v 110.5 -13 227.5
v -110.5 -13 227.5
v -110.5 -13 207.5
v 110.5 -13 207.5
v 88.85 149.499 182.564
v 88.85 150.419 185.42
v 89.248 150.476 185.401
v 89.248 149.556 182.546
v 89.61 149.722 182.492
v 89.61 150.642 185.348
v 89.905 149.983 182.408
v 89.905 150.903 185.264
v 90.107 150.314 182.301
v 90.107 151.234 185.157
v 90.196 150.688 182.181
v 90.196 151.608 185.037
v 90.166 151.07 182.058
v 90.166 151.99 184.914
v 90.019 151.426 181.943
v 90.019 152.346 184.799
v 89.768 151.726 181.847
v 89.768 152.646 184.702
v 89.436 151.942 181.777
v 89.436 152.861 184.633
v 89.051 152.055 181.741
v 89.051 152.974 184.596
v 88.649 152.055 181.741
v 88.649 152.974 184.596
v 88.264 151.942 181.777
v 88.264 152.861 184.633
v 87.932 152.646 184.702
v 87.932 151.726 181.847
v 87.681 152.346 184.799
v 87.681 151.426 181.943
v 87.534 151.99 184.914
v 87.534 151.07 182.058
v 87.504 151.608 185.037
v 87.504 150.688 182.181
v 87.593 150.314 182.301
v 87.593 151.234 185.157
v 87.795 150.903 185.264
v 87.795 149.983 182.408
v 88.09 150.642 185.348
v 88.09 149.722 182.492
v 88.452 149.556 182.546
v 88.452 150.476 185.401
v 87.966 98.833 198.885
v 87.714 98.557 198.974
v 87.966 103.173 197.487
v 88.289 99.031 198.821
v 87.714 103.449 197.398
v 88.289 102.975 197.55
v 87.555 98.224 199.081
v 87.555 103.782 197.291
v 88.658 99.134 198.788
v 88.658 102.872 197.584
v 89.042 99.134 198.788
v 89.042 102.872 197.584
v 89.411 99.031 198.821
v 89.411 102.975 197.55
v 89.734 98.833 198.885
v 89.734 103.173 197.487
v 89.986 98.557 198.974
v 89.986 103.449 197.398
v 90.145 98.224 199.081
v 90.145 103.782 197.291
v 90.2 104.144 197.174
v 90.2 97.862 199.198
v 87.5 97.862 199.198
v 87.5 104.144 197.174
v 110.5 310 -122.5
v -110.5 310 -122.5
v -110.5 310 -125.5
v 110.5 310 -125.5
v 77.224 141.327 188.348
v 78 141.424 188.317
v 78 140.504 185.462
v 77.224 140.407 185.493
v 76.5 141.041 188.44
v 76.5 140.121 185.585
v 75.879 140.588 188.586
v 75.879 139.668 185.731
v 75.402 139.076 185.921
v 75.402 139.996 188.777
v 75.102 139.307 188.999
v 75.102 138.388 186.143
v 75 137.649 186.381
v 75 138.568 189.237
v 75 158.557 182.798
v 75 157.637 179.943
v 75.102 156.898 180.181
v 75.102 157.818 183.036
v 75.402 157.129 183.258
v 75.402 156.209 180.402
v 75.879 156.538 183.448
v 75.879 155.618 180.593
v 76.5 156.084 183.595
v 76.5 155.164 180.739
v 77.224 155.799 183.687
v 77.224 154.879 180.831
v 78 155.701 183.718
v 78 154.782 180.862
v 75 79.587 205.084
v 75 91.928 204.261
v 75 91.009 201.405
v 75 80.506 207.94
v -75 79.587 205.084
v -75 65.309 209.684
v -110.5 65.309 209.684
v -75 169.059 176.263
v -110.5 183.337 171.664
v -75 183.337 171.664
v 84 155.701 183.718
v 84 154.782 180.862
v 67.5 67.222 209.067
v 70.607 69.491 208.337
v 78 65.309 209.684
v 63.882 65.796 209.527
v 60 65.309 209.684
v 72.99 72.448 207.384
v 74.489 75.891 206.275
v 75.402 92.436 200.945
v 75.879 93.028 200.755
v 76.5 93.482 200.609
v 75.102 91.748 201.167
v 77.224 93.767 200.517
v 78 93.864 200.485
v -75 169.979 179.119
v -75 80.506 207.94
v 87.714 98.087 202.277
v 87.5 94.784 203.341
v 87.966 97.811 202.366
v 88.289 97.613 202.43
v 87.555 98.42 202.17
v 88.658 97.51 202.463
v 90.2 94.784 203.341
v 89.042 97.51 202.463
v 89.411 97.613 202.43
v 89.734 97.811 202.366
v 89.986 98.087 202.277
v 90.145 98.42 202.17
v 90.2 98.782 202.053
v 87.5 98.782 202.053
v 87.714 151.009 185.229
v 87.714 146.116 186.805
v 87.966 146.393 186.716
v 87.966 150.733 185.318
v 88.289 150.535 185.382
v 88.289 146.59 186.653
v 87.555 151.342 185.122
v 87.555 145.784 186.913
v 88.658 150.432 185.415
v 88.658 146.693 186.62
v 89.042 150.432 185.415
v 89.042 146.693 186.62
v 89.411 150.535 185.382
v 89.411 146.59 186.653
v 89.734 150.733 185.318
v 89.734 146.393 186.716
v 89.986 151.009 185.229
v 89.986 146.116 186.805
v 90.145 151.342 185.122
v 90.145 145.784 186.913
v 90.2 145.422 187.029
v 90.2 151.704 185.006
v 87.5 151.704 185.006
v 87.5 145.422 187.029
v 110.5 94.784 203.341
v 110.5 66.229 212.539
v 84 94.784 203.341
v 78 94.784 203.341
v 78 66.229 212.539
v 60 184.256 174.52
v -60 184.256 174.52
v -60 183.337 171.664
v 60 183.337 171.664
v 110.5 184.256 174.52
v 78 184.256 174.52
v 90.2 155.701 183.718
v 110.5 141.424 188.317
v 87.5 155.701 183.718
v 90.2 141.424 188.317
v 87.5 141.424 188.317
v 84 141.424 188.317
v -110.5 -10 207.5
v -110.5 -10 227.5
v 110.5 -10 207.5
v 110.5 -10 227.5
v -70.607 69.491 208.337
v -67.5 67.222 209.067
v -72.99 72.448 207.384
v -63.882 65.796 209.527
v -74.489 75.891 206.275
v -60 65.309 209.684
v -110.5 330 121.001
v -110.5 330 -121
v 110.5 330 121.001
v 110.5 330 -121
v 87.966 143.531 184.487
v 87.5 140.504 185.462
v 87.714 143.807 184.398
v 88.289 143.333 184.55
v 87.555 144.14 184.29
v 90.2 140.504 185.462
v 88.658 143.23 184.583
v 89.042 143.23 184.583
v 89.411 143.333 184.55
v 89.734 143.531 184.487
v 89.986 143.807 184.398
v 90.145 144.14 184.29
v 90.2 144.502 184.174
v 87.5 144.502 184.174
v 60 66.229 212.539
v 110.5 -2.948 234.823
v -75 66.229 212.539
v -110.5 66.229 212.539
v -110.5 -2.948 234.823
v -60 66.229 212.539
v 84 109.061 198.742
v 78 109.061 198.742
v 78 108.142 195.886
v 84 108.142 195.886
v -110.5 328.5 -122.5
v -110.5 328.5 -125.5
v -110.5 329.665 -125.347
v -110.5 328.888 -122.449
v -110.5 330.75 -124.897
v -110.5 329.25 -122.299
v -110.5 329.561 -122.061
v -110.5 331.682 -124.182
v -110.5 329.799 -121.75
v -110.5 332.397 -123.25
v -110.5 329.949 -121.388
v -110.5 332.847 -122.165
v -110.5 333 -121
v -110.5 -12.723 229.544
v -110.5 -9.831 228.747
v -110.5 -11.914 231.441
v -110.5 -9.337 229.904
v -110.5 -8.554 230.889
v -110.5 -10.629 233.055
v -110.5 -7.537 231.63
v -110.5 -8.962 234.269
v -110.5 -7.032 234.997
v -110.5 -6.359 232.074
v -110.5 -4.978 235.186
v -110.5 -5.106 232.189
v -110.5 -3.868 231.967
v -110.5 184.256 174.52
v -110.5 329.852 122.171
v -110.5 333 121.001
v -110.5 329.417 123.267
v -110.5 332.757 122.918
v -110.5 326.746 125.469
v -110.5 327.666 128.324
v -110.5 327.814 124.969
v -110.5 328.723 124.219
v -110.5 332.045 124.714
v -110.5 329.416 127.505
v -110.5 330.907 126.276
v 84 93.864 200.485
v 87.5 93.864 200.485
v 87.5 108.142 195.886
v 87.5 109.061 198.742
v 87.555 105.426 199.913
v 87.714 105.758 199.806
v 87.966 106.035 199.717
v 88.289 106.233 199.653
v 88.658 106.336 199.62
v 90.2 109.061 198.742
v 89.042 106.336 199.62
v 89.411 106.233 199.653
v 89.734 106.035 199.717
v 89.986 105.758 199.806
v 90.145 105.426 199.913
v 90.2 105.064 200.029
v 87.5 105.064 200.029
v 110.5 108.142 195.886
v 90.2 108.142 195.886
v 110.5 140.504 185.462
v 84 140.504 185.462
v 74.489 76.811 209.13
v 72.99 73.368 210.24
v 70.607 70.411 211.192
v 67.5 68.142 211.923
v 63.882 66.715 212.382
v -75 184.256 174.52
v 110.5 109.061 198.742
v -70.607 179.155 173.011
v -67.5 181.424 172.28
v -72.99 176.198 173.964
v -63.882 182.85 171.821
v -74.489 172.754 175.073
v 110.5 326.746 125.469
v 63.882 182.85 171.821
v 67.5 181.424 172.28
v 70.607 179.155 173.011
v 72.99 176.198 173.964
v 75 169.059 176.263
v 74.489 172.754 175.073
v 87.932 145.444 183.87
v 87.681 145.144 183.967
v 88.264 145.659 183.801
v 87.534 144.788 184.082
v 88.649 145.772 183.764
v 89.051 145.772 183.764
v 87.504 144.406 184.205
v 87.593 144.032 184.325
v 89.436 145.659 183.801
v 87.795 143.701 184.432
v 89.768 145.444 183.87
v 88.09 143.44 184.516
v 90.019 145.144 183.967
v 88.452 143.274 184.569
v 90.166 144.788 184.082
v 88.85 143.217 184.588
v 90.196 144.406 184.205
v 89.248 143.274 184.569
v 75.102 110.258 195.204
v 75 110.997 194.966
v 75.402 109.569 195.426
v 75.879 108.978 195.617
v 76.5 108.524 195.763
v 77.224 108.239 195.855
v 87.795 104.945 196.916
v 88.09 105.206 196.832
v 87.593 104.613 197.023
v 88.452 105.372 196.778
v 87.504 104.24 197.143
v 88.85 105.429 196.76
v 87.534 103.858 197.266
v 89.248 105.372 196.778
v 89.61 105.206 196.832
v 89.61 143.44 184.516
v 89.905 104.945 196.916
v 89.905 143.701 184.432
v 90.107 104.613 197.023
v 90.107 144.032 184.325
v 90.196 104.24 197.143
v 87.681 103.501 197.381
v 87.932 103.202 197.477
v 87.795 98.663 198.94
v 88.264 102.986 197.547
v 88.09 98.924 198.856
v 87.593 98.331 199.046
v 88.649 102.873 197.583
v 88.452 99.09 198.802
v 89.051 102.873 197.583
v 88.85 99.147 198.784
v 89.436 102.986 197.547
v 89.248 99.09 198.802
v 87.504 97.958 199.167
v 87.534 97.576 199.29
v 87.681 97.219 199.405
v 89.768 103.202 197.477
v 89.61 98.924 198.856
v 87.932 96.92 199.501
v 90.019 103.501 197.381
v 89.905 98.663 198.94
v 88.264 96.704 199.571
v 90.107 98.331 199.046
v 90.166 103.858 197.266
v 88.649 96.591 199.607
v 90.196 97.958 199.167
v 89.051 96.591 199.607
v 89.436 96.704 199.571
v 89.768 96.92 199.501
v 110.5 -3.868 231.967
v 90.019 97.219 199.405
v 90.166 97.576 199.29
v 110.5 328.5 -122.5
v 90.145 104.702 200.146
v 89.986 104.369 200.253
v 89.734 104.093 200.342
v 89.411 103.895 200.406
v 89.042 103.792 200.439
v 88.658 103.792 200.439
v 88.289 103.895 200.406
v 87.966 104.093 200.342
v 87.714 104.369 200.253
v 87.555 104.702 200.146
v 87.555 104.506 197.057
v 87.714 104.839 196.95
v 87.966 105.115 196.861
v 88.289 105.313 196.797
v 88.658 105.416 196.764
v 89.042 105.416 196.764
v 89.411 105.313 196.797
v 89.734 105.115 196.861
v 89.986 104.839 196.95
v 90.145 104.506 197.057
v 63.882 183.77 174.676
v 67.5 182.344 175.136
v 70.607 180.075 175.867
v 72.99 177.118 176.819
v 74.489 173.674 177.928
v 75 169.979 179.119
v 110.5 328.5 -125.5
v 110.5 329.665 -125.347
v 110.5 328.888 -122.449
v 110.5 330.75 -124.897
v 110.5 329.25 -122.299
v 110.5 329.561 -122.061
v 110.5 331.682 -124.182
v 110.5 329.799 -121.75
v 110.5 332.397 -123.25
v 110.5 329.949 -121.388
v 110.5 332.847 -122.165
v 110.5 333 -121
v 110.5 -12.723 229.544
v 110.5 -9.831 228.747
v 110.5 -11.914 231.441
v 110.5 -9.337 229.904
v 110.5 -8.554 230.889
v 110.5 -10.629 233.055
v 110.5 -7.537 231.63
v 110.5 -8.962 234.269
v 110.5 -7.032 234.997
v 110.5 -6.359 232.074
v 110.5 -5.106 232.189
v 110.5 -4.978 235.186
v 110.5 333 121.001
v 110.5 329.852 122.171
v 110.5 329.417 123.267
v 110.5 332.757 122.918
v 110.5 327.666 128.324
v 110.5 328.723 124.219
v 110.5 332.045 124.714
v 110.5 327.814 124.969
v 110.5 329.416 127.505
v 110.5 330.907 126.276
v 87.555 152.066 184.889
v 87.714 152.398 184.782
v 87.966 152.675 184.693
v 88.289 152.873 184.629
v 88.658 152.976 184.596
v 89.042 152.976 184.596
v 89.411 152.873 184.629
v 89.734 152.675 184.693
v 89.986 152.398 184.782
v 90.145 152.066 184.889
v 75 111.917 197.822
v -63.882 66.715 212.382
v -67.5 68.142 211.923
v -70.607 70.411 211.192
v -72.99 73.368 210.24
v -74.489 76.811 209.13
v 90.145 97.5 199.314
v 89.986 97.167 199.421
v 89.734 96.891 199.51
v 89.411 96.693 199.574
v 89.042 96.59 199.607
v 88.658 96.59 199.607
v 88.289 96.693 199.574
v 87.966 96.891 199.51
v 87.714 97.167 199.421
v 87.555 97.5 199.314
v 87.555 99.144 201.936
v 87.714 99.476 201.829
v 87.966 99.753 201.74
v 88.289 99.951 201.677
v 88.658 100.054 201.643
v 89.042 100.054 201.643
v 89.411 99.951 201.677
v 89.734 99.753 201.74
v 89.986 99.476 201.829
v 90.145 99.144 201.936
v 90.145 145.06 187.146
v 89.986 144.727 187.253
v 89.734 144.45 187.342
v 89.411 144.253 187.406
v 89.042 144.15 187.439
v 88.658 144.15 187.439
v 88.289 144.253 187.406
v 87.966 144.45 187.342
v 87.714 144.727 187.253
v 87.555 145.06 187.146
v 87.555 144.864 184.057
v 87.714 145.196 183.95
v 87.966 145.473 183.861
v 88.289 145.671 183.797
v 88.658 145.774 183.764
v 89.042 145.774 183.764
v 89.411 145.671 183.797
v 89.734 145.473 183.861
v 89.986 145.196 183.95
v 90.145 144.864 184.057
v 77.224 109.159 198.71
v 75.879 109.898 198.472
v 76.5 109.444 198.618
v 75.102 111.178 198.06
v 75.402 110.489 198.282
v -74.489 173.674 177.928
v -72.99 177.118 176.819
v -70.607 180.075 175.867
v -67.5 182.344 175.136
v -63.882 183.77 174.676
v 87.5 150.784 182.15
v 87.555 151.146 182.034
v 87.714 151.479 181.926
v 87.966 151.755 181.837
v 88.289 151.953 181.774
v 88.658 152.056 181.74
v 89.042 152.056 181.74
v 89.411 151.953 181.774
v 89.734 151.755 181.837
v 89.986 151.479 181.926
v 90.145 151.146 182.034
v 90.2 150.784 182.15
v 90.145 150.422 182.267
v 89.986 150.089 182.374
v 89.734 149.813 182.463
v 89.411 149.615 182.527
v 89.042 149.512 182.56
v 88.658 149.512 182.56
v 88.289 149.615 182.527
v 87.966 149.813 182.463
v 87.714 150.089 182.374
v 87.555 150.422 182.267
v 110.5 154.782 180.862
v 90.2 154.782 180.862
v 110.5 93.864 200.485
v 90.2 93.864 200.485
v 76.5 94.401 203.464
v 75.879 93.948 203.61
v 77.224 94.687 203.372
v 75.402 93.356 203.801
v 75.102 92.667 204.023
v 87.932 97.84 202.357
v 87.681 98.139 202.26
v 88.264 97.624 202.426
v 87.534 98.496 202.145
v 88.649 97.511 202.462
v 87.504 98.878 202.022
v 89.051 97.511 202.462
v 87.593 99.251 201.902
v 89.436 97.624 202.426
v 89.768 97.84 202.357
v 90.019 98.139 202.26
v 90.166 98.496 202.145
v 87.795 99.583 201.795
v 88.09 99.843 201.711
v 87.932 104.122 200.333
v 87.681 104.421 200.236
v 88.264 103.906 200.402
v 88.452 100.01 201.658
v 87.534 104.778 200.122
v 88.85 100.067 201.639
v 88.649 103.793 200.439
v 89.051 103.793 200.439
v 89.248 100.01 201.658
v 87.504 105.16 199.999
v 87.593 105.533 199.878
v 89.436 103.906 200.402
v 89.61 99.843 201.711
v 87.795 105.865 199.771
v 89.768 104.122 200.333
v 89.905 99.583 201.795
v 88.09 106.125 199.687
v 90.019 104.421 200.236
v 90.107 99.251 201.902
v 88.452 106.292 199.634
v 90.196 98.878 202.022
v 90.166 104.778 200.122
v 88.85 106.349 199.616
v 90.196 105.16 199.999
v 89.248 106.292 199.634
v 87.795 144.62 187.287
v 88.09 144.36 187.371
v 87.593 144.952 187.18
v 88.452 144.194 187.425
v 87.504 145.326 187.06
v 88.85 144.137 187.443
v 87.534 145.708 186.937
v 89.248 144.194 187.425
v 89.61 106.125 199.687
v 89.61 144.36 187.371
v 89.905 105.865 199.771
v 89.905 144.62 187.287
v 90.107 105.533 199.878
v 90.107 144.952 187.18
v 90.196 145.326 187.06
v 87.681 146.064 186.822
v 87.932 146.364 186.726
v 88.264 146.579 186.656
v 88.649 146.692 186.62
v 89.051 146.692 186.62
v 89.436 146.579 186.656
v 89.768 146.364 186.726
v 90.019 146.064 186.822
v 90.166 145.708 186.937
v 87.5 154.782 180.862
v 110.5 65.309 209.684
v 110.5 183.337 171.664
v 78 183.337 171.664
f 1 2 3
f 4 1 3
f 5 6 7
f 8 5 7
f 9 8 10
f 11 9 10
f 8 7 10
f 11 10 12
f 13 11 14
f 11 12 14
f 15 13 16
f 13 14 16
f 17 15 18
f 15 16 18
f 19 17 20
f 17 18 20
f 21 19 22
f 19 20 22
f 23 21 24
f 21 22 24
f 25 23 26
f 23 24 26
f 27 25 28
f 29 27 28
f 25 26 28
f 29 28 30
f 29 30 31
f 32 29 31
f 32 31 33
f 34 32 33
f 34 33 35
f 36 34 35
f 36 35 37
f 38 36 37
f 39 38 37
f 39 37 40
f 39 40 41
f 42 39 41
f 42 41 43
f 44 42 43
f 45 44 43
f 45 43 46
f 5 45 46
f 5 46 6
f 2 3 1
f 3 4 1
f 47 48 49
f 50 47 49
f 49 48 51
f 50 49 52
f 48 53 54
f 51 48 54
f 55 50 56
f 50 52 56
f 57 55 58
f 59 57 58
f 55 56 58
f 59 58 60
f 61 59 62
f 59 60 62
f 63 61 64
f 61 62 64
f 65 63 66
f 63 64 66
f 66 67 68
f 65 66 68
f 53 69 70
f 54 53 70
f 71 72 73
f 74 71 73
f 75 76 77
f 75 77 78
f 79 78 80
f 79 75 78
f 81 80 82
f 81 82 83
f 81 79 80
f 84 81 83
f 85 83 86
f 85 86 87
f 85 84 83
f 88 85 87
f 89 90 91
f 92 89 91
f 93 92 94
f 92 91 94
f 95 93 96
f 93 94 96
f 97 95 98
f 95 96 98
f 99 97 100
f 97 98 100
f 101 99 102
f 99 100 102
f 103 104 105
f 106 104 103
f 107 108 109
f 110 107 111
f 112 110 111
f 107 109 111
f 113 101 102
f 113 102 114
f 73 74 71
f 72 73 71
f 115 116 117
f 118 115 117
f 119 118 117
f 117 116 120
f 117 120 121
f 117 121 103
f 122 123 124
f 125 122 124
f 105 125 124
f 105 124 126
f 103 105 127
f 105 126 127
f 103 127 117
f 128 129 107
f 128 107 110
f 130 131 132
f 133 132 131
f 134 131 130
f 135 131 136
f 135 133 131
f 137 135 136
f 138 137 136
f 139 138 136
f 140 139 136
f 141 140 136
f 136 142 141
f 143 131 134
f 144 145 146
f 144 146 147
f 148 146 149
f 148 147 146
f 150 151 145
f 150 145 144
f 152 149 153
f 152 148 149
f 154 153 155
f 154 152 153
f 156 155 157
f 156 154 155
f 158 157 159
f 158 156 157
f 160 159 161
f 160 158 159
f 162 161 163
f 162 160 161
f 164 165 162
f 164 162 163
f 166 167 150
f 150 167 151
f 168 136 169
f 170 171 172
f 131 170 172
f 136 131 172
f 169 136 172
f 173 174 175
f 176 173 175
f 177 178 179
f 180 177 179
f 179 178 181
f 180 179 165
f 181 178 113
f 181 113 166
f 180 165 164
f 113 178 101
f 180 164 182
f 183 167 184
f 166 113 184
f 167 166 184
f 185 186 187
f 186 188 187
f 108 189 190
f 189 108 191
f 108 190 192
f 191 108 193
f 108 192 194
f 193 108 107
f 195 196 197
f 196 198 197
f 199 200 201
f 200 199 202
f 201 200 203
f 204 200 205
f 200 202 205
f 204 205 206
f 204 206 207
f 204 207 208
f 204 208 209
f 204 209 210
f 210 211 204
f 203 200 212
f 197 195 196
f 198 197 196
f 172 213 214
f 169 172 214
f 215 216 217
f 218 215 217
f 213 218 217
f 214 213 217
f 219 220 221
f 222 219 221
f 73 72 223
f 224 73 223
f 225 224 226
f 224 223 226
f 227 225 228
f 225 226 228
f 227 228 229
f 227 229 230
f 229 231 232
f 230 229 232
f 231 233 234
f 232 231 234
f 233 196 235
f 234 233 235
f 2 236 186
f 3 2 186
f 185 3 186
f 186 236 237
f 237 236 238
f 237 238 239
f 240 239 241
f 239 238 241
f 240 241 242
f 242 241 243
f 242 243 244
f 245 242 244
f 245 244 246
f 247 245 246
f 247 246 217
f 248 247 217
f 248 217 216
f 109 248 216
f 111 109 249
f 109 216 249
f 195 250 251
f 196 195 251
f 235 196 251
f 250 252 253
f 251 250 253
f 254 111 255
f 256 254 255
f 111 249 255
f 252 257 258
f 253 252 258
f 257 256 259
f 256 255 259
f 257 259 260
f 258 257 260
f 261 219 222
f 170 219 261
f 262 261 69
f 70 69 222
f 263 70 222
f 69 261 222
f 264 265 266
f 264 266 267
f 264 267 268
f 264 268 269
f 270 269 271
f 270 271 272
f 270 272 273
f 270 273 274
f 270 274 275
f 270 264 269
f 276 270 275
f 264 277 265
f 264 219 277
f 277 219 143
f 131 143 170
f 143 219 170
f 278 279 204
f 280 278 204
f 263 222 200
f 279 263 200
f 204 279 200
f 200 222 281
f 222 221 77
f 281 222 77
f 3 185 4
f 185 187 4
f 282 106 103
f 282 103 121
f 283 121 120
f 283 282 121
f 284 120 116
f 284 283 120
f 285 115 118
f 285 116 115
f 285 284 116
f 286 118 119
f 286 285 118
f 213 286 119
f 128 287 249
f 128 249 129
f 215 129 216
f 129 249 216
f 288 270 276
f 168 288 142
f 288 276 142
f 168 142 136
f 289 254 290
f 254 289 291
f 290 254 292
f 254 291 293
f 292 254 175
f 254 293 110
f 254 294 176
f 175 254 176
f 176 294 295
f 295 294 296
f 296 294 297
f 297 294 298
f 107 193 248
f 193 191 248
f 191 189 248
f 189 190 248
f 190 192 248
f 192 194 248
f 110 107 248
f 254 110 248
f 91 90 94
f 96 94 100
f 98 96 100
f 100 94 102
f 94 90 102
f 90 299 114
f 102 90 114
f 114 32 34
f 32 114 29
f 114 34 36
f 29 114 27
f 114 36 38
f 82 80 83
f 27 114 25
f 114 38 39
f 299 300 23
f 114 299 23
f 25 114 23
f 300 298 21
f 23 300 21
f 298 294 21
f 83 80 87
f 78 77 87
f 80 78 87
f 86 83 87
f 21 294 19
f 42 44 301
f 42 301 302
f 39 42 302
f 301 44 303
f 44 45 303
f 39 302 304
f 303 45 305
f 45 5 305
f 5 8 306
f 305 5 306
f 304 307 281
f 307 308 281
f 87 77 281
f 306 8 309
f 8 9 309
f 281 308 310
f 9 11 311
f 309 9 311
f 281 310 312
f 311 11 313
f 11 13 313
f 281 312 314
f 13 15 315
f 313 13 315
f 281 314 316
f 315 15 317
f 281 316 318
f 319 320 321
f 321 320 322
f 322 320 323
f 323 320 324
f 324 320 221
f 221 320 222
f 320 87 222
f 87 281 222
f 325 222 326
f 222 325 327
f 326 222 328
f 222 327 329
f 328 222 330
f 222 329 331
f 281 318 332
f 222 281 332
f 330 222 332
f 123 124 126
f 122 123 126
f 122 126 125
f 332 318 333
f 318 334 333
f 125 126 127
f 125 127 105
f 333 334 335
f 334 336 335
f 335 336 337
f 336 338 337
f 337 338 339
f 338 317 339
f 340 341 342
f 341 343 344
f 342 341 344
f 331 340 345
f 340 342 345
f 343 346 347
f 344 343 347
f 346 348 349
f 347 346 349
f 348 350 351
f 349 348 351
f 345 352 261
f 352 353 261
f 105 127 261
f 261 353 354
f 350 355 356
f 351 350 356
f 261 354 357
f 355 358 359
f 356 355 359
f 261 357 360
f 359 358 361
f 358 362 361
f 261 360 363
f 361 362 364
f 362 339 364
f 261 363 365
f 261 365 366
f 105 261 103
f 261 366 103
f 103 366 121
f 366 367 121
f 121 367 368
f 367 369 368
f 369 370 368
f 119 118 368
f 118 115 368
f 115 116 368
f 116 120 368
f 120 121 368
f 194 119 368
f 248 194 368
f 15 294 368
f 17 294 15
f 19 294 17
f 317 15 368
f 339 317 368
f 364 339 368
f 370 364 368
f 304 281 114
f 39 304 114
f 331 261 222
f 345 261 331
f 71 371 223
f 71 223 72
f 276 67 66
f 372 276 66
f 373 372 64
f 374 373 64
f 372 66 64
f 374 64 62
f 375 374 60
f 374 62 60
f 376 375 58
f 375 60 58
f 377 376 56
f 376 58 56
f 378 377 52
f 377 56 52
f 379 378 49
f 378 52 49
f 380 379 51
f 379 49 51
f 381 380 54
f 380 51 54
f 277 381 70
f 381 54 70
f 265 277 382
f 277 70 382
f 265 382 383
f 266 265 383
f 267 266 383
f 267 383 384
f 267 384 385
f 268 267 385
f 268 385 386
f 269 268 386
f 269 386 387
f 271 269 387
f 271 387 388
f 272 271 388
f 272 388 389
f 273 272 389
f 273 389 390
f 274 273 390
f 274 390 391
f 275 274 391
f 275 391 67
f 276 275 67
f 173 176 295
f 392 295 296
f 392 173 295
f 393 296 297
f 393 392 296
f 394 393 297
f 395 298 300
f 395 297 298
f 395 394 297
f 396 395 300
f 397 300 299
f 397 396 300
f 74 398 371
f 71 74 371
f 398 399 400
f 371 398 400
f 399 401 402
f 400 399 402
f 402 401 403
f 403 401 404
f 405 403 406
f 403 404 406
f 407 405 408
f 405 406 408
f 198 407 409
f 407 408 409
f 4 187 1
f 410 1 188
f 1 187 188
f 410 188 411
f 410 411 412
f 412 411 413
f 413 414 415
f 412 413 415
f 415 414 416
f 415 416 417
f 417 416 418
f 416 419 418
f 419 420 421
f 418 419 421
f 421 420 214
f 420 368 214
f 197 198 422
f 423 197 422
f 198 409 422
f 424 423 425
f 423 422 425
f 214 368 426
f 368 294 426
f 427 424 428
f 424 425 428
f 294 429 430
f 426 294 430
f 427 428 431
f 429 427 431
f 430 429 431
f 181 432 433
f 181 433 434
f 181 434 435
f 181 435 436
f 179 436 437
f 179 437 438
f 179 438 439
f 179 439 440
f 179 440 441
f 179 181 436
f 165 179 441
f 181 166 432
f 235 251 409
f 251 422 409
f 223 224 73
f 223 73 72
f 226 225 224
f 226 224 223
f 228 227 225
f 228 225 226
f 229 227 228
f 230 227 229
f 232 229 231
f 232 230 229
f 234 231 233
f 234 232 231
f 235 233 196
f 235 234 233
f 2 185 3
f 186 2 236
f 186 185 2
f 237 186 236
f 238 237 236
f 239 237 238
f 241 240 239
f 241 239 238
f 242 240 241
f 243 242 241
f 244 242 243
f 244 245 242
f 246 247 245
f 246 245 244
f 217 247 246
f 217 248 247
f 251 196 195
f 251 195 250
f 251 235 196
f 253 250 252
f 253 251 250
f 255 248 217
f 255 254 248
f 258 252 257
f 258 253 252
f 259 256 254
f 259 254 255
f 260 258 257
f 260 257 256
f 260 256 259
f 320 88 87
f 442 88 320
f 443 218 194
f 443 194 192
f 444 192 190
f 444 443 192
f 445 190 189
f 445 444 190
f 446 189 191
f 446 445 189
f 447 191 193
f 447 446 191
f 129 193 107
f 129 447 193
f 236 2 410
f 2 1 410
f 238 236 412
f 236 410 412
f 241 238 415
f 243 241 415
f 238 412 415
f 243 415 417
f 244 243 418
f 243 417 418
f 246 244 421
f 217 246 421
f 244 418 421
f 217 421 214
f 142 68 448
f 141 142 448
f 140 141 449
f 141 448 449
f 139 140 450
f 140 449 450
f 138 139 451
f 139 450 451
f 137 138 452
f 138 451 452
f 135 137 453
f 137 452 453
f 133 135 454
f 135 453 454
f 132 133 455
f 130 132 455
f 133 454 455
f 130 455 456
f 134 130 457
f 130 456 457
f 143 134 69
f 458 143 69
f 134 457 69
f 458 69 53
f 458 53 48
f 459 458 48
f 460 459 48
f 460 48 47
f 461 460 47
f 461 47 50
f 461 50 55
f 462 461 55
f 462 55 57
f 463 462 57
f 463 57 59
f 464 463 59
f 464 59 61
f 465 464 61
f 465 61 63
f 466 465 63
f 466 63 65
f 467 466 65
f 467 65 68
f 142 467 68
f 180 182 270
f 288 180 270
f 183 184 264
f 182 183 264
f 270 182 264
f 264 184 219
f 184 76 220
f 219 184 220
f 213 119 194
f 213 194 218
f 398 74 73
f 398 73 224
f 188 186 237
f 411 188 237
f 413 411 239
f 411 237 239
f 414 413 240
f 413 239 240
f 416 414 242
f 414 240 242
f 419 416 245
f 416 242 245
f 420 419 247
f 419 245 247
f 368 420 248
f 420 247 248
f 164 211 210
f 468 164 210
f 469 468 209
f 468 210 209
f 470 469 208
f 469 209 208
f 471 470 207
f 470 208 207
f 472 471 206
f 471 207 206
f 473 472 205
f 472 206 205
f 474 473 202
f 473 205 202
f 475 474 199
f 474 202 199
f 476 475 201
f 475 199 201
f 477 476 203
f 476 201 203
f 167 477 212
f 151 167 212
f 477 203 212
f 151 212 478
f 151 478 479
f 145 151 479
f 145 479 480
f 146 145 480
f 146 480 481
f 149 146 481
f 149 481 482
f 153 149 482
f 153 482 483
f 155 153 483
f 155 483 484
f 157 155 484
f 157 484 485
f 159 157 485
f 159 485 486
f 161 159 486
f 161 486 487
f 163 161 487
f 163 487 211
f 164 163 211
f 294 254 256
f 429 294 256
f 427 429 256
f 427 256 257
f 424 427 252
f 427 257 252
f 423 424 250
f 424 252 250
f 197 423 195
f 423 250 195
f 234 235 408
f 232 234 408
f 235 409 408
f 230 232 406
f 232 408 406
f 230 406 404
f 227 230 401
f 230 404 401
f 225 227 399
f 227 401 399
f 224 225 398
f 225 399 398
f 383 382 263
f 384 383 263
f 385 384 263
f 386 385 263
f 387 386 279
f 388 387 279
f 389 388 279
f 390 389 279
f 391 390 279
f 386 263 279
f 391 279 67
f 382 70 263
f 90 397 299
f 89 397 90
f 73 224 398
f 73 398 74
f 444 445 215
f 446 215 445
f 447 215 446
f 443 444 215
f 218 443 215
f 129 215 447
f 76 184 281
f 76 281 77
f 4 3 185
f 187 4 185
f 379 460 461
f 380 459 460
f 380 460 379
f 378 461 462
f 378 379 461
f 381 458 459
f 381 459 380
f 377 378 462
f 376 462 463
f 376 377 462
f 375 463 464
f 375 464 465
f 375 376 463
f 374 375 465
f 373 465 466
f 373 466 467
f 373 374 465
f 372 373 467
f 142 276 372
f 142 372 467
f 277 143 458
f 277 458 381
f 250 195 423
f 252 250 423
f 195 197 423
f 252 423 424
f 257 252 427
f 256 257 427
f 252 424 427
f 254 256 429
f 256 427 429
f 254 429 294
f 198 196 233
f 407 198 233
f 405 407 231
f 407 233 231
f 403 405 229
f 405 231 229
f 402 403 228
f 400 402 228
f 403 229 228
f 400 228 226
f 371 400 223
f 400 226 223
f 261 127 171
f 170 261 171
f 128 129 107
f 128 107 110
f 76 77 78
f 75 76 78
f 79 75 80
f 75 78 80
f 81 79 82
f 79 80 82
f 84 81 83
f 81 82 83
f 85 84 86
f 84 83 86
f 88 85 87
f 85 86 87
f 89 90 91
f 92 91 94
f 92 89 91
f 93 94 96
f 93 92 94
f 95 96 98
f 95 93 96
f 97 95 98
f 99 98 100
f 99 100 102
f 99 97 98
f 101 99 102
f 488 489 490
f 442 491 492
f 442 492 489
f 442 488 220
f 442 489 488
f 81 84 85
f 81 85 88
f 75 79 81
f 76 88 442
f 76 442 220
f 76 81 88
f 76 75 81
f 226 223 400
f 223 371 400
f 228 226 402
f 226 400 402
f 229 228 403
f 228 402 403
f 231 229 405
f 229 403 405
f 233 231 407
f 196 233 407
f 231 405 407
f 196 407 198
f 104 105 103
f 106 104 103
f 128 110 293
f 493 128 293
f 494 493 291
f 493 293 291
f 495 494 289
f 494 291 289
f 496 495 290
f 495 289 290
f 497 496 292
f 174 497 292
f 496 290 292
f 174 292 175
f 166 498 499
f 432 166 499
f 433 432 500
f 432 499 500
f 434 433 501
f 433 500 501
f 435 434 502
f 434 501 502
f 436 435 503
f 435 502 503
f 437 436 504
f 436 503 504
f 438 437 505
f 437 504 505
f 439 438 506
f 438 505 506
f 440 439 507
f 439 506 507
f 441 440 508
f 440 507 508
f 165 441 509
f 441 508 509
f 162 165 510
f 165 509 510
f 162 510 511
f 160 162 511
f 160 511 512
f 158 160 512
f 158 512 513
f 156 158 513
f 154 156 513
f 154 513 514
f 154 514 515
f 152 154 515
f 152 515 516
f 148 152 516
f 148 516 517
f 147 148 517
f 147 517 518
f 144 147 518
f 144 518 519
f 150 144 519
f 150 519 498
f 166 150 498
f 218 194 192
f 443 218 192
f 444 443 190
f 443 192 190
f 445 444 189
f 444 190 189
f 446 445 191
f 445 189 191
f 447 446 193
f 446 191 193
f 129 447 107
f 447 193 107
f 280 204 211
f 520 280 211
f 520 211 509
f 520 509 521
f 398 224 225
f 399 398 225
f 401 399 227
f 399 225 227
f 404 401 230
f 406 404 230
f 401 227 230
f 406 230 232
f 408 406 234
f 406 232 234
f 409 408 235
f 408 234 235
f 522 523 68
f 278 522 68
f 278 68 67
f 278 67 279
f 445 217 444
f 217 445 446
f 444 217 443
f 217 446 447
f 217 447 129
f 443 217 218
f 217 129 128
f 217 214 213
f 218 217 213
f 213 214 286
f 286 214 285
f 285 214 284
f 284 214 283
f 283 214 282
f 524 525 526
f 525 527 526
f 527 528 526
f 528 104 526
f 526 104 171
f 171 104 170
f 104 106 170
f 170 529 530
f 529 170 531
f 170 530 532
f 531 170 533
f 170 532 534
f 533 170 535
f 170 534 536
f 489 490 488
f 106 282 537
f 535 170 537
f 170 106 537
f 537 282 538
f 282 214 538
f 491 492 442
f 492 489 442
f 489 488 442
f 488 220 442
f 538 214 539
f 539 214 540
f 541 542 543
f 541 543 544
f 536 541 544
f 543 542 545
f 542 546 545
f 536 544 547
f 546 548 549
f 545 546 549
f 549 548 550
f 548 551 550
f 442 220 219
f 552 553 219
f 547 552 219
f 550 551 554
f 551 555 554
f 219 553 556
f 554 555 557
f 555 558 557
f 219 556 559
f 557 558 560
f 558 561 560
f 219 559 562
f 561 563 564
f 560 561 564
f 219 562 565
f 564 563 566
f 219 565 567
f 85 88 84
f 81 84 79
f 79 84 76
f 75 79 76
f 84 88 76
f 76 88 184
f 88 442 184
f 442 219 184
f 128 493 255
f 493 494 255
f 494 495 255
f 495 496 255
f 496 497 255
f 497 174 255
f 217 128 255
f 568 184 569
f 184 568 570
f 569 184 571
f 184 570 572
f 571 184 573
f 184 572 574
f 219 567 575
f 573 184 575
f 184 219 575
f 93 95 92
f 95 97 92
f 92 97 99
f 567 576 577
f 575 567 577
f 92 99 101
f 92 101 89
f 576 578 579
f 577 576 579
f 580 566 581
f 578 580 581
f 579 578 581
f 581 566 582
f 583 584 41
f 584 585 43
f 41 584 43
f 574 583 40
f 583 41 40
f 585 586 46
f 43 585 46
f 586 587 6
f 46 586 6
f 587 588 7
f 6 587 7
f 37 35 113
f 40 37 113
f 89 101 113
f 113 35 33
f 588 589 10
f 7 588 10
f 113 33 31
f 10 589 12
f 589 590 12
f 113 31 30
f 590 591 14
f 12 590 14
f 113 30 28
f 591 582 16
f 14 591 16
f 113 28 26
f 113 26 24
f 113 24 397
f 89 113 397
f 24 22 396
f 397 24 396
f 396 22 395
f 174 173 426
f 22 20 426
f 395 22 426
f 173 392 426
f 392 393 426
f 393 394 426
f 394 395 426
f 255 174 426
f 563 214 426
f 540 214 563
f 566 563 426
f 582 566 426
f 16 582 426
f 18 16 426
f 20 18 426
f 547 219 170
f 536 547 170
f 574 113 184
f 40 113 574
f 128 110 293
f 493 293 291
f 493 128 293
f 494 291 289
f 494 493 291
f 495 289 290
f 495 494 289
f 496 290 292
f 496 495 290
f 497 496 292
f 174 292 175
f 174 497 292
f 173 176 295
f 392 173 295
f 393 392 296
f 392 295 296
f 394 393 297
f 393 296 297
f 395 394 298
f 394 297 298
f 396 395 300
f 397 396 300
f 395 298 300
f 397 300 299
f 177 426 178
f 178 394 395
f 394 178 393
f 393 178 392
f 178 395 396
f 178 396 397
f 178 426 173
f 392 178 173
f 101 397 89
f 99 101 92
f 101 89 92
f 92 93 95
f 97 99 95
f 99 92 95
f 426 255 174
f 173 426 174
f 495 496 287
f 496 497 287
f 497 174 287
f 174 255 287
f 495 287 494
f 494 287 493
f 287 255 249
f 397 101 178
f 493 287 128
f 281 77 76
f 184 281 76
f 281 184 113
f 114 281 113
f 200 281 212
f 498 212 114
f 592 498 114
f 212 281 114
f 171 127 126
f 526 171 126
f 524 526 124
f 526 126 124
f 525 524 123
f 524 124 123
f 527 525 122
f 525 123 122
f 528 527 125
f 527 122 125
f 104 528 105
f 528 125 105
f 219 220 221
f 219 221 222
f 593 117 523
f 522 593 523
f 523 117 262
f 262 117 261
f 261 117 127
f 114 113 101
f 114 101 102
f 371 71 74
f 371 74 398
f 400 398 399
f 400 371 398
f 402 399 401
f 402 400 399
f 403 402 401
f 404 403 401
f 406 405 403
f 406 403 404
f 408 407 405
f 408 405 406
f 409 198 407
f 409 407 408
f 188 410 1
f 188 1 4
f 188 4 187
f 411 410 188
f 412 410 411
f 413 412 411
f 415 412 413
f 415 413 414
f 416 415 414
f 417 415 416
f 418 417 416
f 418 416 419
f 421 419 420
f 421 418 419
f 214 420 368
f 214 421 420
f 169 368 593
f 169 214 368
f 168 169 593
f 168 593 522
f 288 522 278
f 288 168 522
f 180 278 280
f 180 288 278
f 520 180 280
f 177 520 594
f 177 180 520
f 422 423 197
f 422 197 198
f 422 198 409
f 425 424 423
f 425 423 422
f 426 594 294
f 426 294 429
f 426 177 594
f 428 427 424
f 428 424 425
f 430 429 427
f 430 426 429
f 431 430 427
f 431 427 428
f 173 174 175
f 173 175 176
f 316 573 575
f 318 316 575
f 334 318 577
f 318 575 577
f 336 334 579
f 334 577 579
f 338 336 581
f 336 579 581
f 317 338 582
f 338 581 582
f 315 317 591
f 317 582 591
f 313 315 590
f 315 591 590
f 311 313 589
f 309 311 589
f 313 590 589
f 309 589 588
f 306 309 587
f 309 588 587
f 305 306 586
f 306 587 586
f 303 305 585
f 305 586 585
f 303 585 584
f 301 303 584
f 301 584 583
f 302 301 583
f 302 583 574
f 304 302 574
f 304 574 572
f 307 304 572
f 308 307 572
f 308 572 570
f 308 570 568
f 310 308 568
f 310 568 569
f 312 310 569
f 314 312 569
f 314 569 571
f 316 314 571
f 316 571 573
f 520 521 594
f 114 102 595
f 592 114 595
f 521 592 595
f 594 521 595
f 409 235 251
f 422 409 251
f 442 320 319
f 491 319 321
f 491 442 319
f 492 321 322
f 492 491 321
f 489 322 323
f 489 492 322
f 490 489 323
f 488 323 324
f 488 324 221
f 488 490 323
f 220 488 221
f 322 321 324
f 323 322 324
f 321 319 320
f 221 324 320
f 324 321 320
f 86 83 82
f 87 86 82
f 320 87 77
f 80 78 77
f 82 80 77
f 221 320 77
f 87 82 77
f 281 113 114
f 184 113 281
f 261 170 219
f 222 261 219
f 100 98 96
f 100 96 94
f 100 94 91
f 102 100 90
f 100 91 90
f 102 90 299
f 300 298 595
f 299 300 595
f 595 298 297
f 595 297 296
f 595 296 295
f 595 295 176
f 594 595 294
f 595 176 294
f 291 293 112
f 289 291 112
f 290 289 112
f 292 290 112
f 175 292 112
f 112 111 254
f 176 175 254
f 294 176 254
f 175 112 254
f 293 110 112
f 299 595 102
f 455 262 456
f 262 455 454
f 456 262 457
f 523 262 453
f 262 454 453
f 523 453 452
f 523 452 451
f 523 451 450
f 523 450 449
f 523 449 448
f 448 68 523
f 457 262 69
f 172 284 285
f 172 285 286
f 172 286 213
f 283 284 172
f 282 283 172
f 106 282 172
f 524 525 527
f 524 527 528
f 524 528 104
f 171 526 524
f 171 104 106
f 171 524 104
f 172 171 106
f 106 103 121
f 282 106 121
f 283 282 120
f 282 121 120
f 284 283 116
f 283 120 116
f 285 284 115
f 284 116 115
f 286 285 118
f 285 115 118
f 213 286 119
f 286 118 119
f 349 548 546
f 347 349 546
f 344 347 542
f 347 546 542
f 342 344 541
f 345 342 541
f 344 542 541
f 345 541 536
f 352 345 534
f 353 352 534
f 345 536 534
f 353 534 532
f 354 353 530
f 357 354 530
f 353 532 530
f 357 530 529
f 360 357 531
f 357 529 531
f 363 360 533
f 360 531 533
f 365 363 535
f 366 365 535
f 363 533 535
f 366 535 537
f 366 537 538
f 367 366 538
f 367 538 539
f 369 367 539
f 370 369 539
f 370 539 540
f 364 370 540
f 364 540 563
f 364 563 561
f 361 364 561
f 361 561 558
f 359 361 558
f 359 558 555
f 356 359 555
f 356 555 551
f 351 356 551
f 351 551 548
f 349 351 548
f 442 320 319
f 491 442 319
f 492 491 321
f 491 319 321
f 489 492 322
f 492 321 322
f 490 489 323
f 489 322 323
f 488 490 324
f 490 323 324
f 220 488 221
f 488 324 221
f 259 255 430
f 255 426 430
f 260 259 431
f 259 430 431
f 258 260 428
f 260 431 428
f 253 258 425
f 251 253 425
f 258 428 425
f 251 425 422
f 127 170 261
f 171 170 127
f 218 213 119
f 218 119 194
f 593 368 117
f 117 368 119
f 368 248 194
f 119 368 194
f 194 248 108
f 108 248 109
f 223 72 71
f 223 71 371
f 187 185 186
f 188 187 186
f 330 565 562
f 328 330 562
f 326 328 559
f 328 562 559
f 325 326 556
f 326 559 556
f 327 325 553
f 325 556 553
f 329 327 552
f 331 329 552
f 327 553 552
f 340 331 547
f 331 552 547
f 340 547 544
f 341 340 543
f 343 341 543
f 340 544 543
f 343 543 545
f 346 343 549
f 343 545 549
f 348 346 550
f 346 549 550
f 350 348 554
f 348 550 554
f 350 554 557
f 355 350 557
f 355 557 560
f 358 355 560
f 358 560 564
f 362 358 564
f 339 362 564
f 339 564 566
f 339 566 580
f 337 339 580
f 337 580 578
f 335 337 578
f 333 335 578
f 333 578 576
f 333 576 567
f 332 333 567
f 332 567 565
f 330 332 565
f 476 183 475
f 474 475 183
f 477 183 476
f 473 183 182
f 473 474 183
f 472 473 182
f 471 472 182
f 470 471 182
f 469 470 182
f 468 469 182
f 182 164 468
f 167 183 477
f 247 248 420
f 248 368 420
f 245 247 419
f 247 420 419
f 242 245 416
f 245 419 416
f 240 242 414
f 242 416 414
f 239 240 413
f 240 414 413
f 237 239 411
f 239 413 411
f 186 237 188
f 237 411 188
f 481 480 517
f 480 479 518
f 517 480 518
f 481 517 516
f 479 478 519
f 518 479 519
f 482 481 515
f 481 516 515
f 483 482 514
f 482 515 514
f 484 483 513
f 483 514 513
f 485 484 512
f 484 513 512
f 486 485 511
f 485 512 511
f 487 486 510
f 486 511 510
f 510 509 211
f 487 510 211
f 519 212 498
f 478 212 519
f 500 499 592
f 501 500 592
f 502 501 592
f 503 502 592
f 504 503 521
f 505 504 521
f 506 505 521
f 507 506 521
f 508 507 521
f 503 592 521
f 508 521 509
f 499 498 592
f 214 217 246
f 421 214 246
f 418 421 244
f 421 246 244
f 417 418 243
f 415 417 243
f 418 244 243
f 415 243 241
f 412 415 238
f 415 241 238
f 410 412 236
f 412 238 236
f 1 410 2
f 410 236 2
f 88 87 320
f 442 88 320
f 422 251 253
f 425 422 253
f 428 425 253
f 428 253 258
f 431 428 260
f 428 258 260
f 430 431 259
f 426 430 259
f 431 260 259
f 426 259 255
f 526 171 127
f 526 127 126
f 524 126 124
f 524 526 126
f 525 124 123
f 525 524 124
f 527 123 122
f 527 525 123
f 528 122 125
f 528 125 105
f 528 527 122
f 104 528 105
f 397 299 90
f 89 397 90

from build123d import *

# Parameters (mm, degrees)
EXTRUDE_THIN1_DEPTH    = 110.5
CUT_EXTRUDE1_REACH     = 444.866
SKETCH2_R              = 1.35
CONVERT_SOLID1_START   = -110.5
CONVERT_SOLID1_DEPTH   = 221
CONVERT_SOLID1_2_DEPTH = 35.5
CONVERT_SOLID1_START_2 = 78
CONVERT_SOLID1_3_DEPTH = 32.5
CONVERT_SOLID1_START_3 = 90.2000001
CONVERT_SOLID1_4_DEPTH = 20.2999999
CONVERT_SOLID1_START_4 = 84
CONVERT_SOLID1_5_DEPTH = 3.4999999
CONVERT_SOLID1_START_5 = 219.608669628
CONVERT_SOLID1_6_DEPTH = 3.000000001


with BuildPart() as part:
    # Sketch1 → Extrude-Thin1 (new, symmetric)
    with BuildSketch(Plane(origin=(0, 0, 0), x_dir=(0, 0, -1), z_dir=(1, 0, 0))):
        with BuildLine():
            Line((122.5, 310), (122.5, 328.5))
            ThreePointArc((122.5, 328.5), (122.060660172, 329.560660172), (121, 330))
            Line((121, 330), (-121.0014, 330))
            ThreePointArc((-121.0014, 330), (-123.764798126, 329.10018419), (-125.468557887, 326.745775479))
            Line((-125.468557887, 326.745775479), (-231.967157887, -3.867817213))
            ThreePointArc((-231.967157887, -3.867817213), (-231.293387843, -8.070194473), (-227.5, -10))
            Line((-227.5, -10), (-207.5, -10))
            Line((-207.5, -10), (-207.5, -13))
            Line((-207.5, -13), (-227.5, -13))
            ThreePointArc((-227.5, -13), (-233.718205595, -9.836619923), (-234.822664414, -2.947989795))
            Line((-234.822664414, -2.947989795), (-128.324064414, 327.665602897))
            ThreePointArc((-128.324064414, 327.665602897), (-125.531223577, 331.525001941), (-121.0014, 333))
            Line((-121.0014, 333), (121, 333))
            ThreePointArc((121, 333), (124.181980515, 331.681980515), (125.5, 328.5))
            Line((125.5, 328.5), (125.5, 310))
            Line((125.5, 310), (122.5, 310))
        make_face()
    extrude(amount=EXTRUDE_THIN1_DEPTH, both=True)

    # Sketch2 → Cut-Extrude1 (cut, up to next)
    with BuildSketch(Plane(origin=(0, 68.253852605, 211.886836303), x_dir=(1, 0, 0), z_dir=(0, 0.30660913934042044, 0.9518355087266532)), mode=Mode.PRIVATE) as cut_extrude1_sk1:
        with Locations(Location((88.85, 87.672559187, 0), (0, 0, 270))):
            Circle(SKETCH2_R)
    cut_extrude1_tool1 = extrude(cut_extrude1_sk1.sketch, amount=-CUT_EXTRUDE1_REACH, mode=Mode.PRIVATE) & part.part
    # Sketch2 → Cut-Extrude1 (cut, up to next)
    with BuildSketch(Plane(origin=(0, 68.253852605, 211.886836303), x_dir=(1, 0, 0), z_dir=(0, 0.30660913934042044, 0.9518355087266532)), mode=Mode.PRIVATE) as cut_extrude1_sk2:
        with Locations(Location((88.85, 81.072559187, 0), (0, 0, 270))):
            Circle(SKETCH2_R)
    cut_extrude1_tool2 = extrude(cut_extrude1_sk2.sketch, amount=-CUT_EXTRUDE1_REACH, mode=Mode.PRIVATE) & part.part
    # Sketch2 → Cut-Extrude1 (cut, up to next)
    with BuildSketch(Plane(origin=(0, 68.253852605, 211.886836303), x_dir=(1, 0, 0), z_dir=(0, 0.30660913934042044, 0.9518355087266532)), mode=Mode.PRIVATE) as cut_extrude1_sk3:
        with Locations(Location((88.85, 38.672559187, 0), (0, 0, 90))):
            Circle(SKETCH2_R)
    cut_extrude1_tool3 = extrude(cut_extrude1_sk3.sketch, amount=-CUT_EXTRUDE1_REACH, mode=Mode.PRIVATE) & part.part
    # Sketch2 → Cut-Extrude1 (cut, up to next)
    with BuildSketch(Plane(origin=(0, 68.253852605, 211.886836303), x_dir=(1, 0, 0), z_dir=(0, 0.30660913934042044, 0.9518355087266532)), mode=Mode.PRIVATE) as cut_extrude1_sk4:
        with Locations(Location((88.85, 32.072559187, 0), (0, 0, 90))):
            Circle(SKETCH2_R)
    cut_extrude1_tool4 = extrude(cut_extrude1_sk4.sketch, amount=-CUT_EXTRUDE1_REACH, mode=Mode.PRIVATE) & part.part
    # Sketch2 → Cut-Extrude1 (cut, up to next)
    with BuildSketch(Plane(origin=(0, 68.253852605, 211.886836303), x_dir=(1, 0, 0), z_dir=(0, 0.30660913934042044, 0.9518355087266532)), mode=Mode.PRIVATE) as cut_extrude1_sk5:
        with BuildLine():
            Line((-60, 121.872559187), (60, 121.872559187))
            ThreePointArc((60, 121.872559187), (70.606601718, 117.479160904), (75, 106.872559187))
            Line((75, 106.872559187), (75, 94.872559187))
            ThreePointArc((75, 94.872559187), (75.878679656, 92.751238843), (78, 91.872559187))
            Line((78, 91.872559187), (84, 91.872559187))
            Line((84, 91.872559187), (84, 76.872559187))
            Line((84, 76.872559187), (78, 76.872559187))
            ThreePointArc((78, 76.872559187), (75.878679656, 75.99387953), (75, 73.872559187))
            Line((75, 73.872559187), (75, 45.872559187))
            ThreePointArc((75, 45.872559187), (75.878679656, 43.751238843), (78, 42.872559187))
            Line((78, 42.872559187), (84, 42.872559187))
            Line((84, 42.872559187), (84, 27.872559187))
            Line((84, 27.872559187), (78, 27.872559187))
            ThreePointArc((78, 27.872559187), (75.878679656, 26.99387953), (75, 24.872559187))
            Line((75, 24.872559187), (75, 12.872559187))
            ThreePointArc((75, 12.872559187), (70.606601718, 2.265957469), (60, -2.127440813))
            Line((60, -2.127440813), (-60, -2.127440813))
            ThreePointArc((-60, -2.127440813), (-70.606601718, 2.265957469), (-75, 12.872559187))
            Line((-75, 12.872559187), (-75, 106.872559187))
            ThreePointArc((-75, 106.872559187), (-70.606601718, 117.479160904), (-60, 121.872559187))
        make_face()
    cut_extrude1_tool5 = extrude(cut_extrude1_sk5.sketch, amount=-CUT_EXTRUDE1_REACH, mode=Mode.PRIVATE) & part.part
    add(cut_extrude1_tool1.solids().sort_by_distance((88.85, 151.703708, 185.005628))[0], mode=Mode.SUBTRACT)
    add(cut_extrude1_tool2.solids().sort_by_distance((88.85, 145.421593, 187.029249))[0], mode=Mode.SUBTRACT)
    add(cut_extrude1_tool3.solids().sort_by_distance((88.85, 105.063768, 200.029476))[0], mode=Mode.SUBTRACT)
    add(cut_extrude1_tool4.solids().sort_by_distance((88.85, 98.781653, 202.053097))[0], mode=Mode.SUBTRACT)
    add(cut_extrude1_tool5.solids().sort_by_distance((1.180096, 125.24268, 193.529362))[0], mode=Mode.SUBTRACT)


with BuildPart() as body_2:
    # Convert-Solid1: read off the stored shape, not the designer's step
    # Convert-Solid1 outline → Convert-Solid1 (new body)
    with BuildSketch(Plane.YZ.offset(CONVERT_SOLID1_START)):
        with BuildLine():
            Line((-13, 227.5), (-13, 207.5))
            Line((-13, 207.5), (-10, 207.5))
            Line((-10, 207.5), (-10, 227.5))
            ThreePointArc((-10, 227.5), (-8.070194473, 231.293387843), (-3.867817213, 231.967157887))
            Line((-3.867817213, 231.967157887), (65.309051478, 209.683622573))
            Line((65.309051478, 209.683622573), (66.228878896, 212.5391291))
            Line((66.228878896, 212.5391291), (-2.947989795, 234.822664414))
            ThreePointArc((-2.947989795, 234.822664414), (-9.836619923, 233.718205595), (-13, 227.5))
        make_face()
        with BuildLine():
            Line((327.665602897, 128.324064414), (184.256481978, 174.519595822))
            Line((184.256481978, 174.519595822), (183.33665456, 171.664089295))
            Line((183.33665456, 171.664089295), (326.745775479, 125.468557887))
            ThreePointArc((326.745775479, 125.468557887), (329.10018419, 123.764798127), (330, 121.0014))
            Line((330, 121.0014), (330, -121))
            ThreePointArc((330, -121), (329.560660172, -122.060660172), (328.5, -122.5))
            Line((328.5, -122.5), (310, -122.5))
            Line((310, -122.5), (310, -125.5))
            Line((310, -125.5), (328.5, -125.5))
            ThreePointArc((328.5, -125.5), (331.681980515, -124.181980515), (333, -121))
            Line((333, -121), (333, 121.0014))
            ThreePointArc((333, 121.0014), (331.525001941, 125.531223577), (327.665602897, 128.324064414))
        make_face()
    extrude(amount=CONVERT_SOLID1_DEPTH)

    # Convert-Solid1 2 outline → Convert-Solid1 2 (add)
    with BuildSketch(Plane.YZ.offset(CONVERT_SOLID1_START)):
        Polygon((66.228878896, 212.5391291), (65.309051478, 209.683622574), (183.33665456, 171.664089295), (184.256481978, 174.519595822), align=None)
    extrude(amount=CONVERT_SOLID1_2_DEPTH)

    # Convert-Solid1 3 outline → Convert-Solid1 3 (add)
    with BuildSketch(Plane.YZ.offset(CONVERT_SOLID1_START_2)):
        Polygon((94.783944157, 203.34085492), (66.228878896, 212.5391291), (65.309051478, 209.683622574), (93.864116739, 200.485348393), align=None)
        Polygon((141.423884085, 188.317007092), (109.061476788, 198.74171783), (108.14164937, 195.886211303), (140.504056667, 185.461500565), align=None)
        Polygon((184.256481978, 174.519595822), (155.701416716, 183.717870002), (154.781589298, 180.862363476), (183.33665456, 171.664089295), align=None)
    extrude(amount=CONVERT_SOLID1_3_DEPTH)

    # Convert-Solid1 4 outline → Convert-Solid1 4 (add)
    with BuildSketch(Plane.YZ.offset(CONVERT_SOLID1_START_3)):
        Polygon((109.061476788, 198.74171783), (94.783944157, 203.34085492), (93.864116739, 200.485348393), (108.14164937, 195.886211303), align=None)
        Polygon((155.701416716, 183.717870002), (141.423884085, 188.317007092), (140.504056667, 185.461500566), (154.781589298, 180.862363475), align=None)
    extrude(amount=CONVERT_SOLID1_4_DEPTH)

    # Convert-Solid1 5 outline → Convert-Solid1 5 (add)
    with BuildSketch(Plane.YZ.offset(CONVERT_SOLID1_START_4)):
        Polygon((109.061476788, 198.74171783), (94.783944157, 203.34085492), (93.864116739, 200.485348393), (108.14164937, 195.886211303), align=None)
        Polygon((155.701416716, 183.717870002), (141.423884085, 188.317007092), (140.504056667, 185.461500566), (154.781589298, 180.862363475), align=None)
    extrude(amount=CONVERT_SOLID1_5_DEPTH)

    # Convert-Solid1 6 outline → Convert-Solid1 6 (add)
    with BuildSketch(Plane(origin=(0, 0, 0), x_dir=(1, 0, 0), z_dir=(0, 0.3066091393404201, 0.9518355087266533)).offset(CONVERT_SOLID1_START_5)):
        with BuildLine():
            Line((90.2000001, 27.872559186), (90.2, 32.072559187))
            ThreePointArc((90.2, 32.072559187), (88.85, 30.722559187), (87.5, 32.072559187))
            Line((87.5, 32.072559187), (87.4999999, 27.872559186))
            Line((87.4999999, 27.872559186), (90.2000001, 27.872559186))
        make_face()
        with BuildLine():
            ThreePointArc((87.5, 32.072559187), (88.85, 33.422559187), (90.2, 32.072559187))
            Line((90.2, 32.072559187), (90.2, 38.672559187))
            ThreePointArc((90.2, 38.672559187), (88.85, 37.322559187), (87.5, 38.672559187))
            Line((87.5, 38.672559187), (87.5, 32.072559187))
        make_face()
        with BuildLine():
            ThreePointArc((87.5, 38.672559187), (88.85, 40.022559187), (90.2, 38.672559187))
            Line((90.2, 38.672559187), (90.2000001, 42.872559186))
            Line((90.2000001, 42.872559186), (87.4999999, 42.872559186))
            Line((87.4999999, 42.872559186), (87.5, 38.672559187))
        make_face()
        with BuildLine():
            Line((90.2000001, 76.872559186), (90.2, 81.072559187))
            ThreePointArc((90.2, 81.072559187), (88.85, 79.722559187), (87.5, 81.072559187))
            Line((87.5, 81.072559187), (87.4999999, 76.872559186))
            Line((87.4999999, 76.872559186), (90.2000001, 76.872559186))
        make_face()
        with BuildLine():
            ThreePointArc((87.5, 81.072559187), (88.85, 82.422559187), (90.2, 81.072559187))
            Line((90.2, 81.072559187), (90.2, 87.672559187))
            ThreePointArc((90.2, 87.672559187), (88.85, 86.322559187), (87.5, 87.672559187))
            Line((87.5, 87.672559187), (87.5, 81.072559187))
        make_face()
        with BuildLine():
            ThreePointArc((87.5, 87.672559187), (88.85, 89.022559187), (90.2, 87.672559187))
            Line((90.2, 87.672559187), (90.2000001, 91.872559187))
            Line((90.2000001, 91.872559187), (87.4999999, 91.872559187))
            Line((87.4999999, 91.872559187), (87.5, 87.672559187))
        make_face()
        with BuildLine():
            Line((78, -2.127440813), (78, 27.872559187))
            ThreePointArc((78, 27.872559187), (75.878679656, 26.99387953), (75, 24.872559187))
            Line((75, 24.872559187), (75, 12.872559187))
            ThreePointArc((75, 12.872559187), (70.606601718, 2.265957469), (60, -2.127440813))
            Line((60, -2.127440813), (78, -2.127440813))
        make_face()
        with BuildLine():
            Line((78, 121.872559187), (60, 121.872559187))
            ThreePointArc((60, 121.872559187), (70.606601717, 117.479160904), (75, 106.872559187))
            Line((75, 106.872559187), (75, 94.872559187))
            ThreePointArc((75, 94.872559187), (75.878679656, 92.751238843), (78, 91.872559187))
            Line((78, 91.872559187), (78, 121.872559187))
        make_face()
        with BuildLine():
            Line((-75, 121.872559187), (-75, 106.872559187))
            ThreePointArc((-75, 106.872559187), (-70.606601717, 117.479160904), (-60, 121.872559187))
            Line((-60, 121.872559187), (-75, 121.872559187))
        make_face()
        with BuildLine():
            Line((-75, -2.127440813), (-60, -2.127440813))
            ThreePointArc((-60, -2.127440813), (-70.606601718, 2.265957469), (-75, 12.872559187))
            Line((-75, 12.872559187), (-75, -2.127440813))
        make_face()
        with BuildLine():
            Line((75, 73.872559187), (75, 45.872559187))
            ThreePointArc((75, 45.872559187), (75.878679656, 43.751238843), (78, 42.872559187))
            Line((78, 42.872559187), (78, 76.872559187))
            ThreePointArc((78, 76.872559187), (75.878679656, 75.99387953), (75, 73.872559187))
        make_face()
    extrude(amount=CONVERT_SOLID1_6_DEPTH)


solid = Compound([part.part, body_2.part])
